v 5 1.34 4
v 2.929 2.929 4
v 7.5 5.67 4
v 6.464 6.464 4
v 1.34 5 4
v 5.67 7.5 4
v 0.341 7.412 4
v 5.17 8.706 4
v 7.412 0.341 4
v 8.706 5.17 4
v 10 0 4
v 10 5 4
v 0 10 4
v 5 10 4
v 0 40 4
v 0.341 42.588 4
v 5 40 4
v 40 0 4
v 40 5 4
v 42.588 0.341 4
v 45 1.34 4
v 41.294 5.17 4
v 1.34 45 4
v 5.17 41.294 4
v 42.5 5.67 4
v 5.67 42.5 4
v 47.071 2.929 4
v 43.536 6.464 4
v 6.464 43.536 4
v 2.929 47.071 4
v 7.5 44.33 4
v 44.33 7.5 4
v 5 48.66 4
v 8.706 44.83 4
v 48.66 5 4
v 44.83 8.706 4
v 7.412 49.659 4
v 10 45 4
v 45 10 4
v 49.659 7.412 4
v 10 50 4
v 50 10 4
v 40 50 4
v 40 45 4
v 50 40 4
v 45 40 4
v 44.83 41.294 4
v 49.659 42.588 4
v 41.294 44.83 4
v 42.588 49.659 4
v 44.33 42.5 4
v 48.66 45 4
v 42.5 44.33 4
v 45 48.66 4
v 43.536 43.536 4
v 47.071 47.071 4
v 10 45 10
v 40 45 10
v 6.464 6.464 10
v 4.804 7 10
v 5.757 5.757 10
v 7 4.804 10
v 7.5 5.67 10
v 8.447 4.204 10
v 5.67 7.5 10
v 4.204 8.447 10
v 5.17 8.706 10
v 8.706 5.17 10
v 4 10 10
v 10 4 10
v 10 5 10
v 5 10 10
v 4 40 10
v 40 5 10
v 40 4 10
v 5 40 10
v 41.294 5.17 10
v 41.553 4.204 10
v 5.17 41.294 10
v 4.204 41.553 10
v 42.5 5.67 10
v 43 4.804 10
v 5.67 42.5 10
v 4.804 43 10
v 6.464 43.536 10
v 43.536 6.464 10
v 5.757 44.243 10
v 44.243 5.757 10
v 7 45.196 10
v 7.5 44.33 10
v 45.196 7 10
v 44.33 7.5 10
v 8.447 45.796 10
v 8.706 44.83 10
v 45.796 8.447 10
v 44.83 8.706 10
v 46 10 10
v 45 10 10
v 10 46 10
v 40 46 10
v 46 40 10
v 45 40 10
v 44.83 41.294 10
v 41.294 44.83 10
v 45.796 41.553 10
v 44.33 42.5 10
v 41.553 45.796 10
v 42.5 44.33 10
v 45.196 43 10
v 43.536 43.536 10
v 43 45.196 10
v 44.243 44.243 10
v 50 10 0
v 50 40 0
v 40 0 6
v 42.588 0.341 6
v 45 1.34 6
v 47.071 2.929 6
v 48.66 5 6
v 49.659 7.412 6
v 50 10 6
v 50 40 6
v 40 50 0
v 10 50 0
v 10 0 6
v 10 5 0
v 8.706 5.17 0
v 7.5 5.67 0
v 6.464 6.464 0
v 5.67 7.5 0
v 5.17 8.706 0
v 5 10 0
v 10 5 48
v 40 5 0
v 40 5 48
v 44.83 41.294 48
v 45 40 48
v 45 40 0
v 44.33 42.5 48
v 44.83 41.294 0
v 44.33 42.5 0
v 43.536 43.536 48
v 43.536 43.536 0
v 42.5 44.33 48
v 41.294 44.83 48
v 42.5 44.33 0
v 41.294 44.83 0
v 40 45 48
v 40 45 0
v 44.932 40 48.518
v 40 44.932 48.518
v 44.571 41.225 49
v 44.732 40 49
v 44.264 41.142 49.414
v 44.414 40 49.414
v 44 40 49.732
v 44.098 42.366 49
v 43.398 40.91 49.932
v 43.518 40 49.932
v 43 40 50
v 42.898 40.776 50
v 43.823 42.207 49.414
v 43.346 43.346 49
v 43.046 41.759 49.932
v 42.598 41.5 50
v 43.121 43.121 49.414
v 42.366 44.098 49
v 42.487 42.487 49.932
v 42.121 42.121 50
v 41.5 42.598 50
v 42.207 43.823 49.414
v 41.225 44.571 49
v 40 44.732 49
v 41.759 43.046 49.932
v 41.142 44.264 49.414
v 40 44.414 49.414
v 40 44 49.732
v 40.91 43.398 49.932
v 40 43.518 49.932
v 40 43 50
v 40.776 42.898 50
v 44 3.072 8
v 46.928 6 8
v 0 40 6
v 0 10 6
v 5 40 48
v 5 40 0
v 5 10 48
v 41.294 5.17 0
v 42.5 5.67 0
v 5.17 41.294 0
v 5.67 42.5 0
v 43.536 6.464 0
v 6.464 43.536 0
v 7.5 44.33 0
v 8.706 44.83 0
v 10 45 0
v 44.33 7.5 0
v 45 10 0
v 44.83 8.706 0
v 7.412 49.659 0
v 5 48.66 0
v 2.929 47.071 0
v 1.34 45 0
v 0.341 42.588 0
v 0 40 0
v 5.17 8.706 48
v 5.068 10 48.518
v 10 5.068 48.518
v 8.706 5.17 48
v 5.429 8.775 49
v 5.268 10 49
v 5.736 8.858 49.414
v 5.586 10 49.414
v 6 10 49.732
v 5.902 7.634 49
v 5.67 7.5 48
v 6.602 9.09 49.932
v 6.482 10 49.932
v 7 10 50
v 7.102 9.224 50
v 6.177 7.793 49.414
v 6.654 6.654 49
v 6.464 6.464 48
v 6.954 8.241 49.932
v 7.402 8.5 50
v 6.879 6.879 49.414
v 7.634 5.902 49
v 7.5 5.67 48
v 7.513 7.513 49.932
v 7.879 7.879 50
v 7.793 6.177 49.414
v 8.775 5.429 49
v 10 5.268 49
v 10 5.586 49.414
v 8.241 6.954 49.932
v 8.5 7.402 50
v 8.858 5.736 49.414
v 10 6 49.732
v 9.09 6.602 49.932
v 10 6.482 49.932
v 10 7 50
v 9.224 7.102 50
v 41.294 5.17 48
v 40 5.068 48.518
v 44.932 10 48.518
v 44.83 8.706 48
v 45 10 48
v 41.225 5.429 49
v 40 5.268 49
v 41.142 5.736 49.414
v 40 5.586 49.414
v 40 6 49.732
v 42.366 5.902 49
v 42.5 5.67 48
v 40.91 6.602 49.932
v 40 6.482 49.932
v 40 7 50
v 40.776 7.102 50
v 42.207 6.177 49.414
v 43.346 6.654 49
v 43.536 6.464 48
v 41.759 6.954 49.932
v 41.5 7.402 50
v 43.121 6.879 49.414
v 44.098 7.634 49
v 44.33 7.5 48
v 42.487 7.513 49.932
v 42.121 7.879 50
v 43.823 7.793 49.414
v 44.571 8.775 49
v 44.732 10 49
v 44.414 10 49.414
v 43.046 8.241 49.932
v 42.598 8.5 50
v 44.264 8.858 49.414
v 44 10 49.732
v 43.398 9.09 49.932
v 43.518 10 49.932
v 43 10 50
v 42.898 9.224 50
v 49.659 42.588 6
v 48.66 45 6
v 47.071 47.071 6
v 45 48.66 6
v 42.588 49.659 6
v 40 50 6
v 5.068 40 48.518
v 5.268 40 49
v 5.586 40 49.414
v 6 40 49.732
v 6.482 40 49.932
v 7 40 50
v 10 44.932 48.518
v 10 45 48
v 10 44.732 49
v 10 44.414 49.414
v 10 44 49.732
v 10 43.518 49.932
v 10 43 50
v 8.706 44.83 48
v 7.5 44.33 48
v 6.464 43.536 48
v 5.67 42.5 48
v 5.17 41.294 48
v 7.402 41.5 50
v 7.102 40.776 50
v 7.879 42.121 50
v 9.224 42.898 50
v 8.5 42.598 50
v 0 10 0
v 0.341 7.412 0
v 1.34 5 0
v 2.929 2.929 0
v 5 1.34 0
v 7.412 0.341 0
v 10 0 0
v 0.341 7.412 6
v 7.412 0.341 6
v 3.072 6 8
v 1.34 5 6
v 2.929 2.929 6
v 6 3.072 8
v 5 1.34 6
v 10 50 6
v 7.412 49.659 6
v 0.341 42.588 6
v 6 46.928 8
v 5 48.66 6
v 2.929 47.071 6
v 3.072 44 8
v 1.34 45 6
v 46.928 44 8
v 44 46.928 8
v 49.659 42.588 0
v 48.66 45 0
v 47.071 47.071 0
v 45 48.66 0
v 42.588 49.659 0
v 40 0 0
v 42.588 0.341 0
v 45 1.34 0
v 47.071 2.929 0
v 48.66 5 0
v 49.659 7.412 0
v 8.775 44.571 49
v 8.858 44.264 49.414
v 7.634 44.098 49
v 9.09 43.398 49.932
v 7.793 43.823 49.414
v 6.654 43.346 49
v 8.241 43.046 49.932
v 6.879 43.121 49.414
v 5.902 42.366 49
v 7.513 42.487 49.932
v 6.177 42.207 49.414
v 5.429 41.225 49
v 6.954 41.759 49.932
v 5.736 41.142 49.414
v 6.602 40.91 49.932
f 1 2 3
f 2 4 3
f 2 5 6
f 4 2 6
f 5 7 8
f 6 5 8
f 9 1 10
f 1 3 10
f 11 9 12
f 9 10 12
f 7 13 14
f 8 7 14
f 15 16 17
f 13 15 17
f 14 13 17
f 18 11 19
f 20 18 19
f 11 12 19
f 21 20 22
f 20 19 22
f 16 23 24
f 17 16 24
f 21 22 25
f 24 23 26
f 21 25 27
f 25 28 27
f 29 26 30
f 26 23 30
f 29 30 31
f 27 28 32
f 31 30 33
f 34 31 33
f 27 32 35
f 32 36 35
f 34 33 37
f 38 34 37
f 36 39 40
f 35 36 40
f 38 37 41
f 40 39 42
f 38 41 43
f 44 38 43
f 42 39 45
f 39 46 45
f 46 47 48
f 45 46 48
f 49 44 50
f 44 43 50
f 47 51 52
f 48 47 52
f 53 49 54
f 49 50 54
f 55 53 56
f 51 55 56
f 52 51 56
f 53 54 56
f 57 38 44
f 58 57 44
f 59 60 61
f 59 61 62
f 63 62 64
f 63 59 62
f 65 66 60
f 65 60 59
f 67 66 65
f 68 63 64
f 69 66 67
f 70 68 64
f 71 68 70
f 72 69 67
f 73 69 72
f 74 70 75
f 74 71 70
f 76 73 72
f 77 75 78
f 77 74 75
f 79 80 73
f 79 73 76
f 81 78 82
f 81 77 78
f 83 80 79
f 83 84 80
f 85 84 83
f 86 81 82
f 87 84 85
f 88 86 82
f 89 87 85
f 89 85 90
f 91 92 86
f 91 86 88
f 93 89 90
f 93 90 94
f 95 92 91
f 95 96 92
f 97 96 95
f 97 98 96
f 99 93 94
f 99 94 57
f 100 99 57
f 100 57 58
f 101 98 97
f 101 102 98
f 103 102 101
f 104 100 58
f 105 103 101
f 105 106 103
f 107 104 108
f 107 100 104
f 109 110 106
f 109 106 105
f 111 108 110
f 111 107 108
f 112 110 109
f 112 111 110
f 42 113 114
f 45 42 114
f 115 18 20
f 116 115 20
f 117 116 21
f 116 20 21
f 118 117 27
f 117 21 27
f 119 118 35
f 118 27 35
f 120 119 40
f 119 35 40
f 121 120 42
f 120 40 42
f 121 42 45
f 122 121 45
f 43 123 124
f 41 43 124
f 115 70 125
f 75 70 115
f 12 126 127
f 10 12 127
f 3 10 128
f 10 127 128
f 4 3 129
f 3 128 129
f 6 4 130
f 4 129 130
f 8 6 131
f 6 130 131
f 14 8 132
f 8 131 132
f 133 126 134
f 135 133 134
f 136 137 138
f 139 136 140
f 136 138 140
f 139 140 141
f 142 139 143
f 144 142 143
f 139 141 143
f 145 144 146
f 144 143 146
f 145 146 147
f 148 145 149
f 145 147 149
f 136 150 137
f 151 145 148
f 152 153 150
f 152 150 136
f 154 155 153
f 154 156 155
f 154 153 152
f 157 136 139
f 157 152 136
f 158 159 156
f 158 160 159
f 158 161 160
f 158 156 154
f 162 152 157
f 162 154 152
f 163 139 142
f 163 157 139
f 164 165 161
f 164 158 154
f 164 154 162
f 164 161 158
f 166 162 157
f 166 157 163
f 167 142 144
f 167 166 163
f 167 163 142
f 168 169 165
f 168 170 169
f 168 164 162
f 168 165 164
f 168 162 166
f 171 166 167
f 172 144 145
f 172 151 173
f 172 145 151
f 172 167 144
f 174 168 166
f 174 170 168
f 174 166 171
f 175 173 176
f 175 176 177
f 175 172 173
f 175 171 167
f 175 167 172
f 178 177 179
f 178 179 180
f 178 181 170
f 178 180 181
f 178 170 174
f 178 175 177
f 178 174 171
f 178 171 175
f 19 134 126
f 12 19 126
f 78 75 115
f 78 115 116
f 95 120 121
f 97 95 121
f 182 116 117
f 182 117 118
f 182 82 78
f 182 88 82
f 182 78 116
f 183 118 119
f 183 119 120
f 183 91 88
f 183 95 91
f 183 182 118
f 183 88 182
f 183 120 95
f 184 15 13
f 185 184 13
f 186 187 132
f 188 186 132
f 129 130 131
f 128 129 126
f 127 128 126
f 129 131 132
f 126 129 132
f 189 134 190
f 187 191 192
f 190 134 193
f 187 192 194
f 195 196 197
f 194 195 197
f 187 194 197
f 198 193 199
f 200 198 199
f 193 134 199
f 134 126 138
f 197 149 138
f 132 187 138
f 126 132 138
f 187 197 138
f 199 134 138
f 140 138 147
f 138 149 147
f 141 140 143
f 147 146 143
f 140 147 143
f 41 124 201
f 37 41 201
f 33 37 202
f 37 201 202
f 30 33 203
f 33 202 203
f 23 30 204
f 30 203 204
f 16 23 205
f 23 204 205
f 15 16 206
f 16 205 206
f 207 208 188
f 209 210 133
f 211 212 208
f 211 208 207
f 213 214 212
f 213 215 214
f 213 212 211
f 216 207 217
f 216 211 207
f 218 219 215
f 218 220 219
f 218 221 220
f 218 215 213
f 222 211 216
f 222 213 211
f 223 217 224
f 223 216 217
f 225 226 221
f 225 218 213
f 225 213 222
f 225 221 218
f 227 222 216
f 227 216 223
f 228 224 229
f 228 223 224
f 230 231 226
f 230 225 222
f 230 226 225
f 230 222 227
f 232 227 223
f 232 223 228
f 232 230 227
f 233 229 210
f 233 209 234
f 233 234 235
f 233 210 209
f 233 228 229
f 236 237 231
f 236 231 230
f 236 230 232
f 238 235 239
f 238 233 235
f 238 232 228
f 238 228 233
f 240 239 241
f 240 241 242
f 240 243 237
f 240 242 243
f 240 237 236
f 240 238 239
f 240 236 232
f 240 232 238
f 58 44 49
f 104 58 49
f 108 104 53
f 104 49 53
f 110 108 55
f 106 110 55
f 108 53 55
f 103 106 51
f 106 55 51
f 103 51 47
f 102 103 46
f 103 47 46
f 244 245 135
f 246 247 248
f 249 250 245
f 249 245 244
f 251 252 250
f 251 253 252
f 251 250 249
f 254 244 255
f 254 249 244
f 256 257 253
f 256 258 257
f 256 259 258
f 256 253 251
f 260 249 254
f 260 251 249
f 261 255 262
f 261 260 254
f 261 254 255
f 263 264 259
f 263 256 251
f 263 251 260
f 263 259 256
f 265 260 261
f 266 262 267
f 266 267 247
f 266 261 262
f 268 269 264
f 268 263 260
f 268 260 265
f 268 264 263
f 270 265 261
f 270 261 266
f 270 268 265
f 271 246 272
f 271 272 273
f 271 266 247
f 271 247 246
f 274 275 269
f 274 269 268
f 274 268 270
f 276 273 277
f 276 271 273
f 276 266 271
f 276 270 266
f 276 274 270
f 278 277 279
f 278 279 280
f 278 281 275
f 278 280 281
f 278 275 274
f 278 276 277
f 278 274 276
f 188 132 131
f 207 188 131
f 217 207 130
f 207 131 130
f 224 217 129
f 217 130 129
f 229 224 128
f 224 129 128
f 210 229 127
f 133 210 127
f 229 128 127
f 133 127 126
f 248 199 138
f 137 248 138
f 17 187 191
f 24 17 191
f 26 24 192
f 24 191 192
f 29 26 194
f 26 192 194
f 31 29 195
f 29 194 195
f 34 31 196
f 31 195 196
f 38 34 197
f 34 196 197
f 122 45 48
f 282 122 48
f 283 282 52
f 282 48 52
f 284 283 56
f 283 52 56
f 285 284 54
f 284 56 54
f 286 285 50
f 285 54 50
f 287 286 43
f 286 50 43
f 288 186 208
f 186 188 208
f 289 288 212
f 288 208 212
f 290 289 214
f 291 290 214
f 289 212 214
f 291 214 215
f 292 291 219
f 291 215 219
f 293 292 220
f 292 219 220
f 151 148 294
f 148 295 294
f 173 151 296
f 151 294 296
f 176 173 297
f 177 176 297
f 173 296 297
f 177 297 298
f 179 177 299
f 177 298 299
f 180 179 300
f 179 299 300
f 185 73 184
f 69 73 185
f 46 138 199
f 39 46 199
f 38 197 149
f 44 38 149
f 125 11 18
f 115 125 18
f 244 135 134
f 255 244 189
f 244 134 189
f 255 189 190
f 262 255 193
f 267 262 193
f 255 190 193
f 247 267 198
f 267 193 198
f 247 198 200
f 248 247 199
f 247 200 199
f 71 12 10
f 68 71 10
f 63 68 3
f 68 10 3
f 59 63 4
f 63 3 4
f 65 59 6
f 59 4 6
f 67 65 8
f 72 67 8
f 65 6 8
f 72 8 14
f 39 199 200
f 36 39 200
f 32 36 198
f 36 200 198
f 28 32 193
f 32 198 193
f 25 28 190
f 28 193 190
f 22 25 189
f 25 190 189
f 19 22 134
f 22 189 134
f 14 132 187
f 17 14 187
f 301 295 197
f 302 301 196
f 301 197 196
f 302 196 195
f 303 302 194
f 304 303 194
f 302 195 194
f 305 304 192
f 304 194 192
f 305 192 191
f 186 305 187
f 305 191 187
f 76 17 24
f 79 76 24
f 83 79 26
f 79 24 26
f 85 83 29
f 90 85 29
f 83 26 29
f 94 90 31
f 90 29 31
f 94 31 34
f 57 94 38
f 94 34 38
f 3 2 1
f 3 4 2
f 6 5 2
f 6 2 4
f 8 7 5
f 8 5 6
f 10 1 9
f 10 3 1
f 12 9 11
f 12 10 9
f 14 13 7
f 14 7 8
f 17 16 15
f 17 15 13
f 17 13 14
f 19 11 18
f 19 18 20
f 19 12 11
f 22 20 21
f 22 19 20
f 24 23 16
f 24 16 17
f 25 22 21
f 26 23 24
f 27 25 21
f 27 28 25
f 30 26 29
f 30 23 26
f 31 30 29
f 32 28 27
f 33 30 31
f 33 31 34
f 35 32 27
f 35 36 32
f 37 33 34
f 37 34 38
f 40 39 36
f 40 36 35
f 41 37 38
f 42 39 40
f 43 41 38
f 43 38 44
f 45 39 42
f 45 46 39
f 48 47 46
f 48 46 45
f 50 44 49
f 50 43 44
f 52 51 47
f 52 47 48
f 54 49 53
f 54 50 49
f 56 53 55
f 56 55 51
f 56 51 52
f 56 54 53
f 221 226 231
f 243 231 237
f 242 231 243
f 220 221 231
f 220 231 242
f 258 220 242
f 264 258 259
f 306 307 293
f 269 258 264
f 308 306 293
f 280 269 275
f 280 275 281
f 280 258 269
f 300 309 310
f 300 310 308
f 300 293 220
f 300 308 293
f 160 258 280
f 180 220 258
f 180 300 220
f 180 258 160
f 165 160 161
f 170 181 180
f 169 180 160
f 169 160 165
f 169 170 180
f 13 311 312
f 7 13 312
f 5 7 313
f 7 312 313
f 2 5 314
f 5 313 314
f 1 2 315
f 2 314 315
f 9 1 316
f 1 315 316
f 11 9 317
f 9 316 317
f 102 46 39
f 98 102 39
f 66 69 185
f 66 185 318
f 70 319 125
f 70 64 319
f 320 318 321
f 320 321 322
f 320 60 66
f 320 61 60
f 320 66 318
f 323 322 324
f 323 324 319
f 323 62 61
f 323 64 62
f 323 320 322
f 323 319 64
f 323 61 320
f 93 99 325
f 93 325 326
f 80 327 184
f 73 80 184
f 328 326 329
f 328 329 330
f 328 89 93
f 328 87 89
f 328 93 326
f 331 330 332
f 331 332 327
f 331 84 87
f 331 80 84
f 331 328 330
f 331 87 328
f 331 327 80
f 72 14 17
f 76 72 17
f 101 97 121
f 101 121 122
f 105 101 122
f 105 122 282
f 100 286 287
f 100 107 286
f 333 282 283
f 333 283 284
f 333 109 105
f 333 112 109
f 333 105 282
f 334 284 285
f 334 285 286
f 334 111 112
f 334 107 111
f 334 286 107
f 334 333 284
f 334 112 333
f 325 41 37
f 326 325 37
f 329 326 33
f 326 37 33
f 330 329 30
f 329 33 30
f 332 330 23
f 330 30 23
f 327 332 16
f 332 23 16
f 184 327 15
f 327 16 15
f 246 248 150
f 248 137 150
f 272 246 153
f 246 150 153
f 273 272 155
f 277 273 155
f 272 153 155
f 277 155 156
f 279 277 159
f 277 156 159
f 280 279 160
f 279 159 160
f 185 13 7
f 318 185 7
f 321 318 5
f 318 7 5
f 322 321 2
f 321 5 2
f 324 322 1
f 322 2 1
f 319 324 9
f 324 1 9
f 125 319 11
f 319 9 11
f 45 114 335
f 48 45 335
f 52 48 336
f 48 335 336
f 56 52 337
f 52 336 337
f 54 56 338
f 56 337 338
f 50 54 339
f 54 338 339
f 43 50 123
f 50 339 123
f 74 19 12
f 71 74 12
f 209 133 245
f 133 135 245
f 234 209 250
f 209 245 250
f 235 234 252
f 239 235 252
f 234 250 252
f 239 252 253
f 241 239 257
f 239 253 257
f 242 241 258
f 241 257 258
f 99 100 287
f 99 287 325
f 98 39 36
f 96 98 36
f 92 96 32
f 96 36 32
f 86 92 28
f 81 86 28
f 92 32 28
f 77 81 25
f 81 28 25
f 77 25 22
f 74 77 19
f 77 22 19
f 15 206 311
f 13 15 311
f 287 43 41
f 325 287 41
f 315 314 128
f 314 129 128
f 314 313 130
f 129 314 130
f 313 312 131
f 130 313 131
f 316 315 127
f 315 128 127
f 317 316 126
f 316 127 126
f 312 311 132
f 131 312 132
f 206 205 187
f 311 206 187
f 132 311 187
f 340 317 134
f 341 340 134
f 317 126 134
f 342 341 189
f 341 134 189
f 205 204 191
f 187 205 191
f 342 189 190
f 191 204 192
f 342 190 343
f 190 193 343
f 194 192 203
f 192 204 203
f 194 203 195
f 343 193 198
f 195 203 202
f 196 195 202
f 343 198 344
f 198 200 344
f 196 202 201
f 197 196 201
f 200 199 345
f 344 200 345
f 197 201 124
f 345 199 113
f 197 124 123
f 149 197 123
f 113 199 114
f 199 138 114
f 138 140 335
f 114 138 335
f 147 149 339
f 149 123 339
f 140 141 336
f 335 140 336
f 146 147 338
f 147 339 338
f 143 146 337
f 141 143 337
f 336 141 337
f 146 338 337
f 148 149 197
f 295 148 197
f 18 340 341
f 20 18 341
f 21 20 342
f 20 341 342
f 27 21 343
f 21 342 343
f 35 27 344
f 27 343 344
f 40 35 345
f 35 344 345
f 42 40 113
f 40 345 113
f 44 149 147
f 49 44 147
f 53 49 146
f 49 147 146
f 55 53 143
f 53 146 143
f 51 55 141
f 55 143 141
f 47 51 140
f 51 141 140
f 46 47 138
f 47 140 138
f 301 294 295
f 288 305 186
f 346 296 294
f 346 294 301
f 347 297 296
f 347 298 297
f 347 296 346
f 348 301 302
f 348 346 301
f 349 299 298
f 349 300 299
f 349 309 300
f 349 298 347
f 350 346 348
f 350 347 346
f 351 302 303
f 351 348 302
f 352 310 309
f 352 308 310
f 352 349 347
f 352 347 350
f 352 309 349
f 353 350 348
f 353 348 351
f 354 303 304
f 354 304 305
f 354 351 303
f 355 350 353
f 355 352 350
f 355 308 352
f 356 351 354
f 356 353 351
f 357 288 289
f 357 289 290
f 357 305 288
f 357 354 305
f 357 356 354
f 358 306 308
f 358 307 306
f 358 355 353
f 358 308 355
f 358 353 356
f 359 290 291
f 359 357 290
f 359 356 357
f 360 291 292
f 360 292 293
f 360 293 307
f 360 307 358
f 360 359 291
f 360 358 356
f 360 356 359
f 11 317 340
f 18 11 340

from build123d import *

# Parameters (mm, degrees)
F1_DEPTH = 4
F2_START = 4
F2_DEPTH = 6
F3_SIZE  = 4
F4_DEPTH = 50
F5_R     = 2


with BuildPart() as f1:
    # F0 (on Top) → F1 (new body)
    with BuildSketch(Plane.XY):
        with BuildLine():
            ThreePointArc((0, 10), (2.9289321881, 2.9289321881), (10, 0))
            Line((10, 0), (40, 0))
            ThreePointArc((40, 0), (47.0710678119, 2.9289321881), (50, 10))
            Line((50, 10), (50, 40))
            ThreePointArc((50, 40), (47.0710678119, 47.0710678119), (40, 50))
            Line((40, 50), (10, 50))
            ThreePointArc((10, 50), (2.9289321881, 47.0710678119), (0, 40))
            Line((0, 40), (0, 10))
        make_face()
        with BuildLine():
            Line((40, 5), (10, 5))
            ThreePointArc((10, 5), (6.4644660941, 6.4644660941), (5, 10))
            Line((5, 10), (5, 40))
            ThreePointArc((5, 40), (6.4644660941, 43.5355339059), (10, 45))
            Line((10, 45), (40, 45))
            ThreePointArc((40, 45), (43.5355339059, 43.5355339059), (45, 40))
            Line((45, 40), (45, 10))
            ThreePointArc((45, 10), (43.5355339059, 6.4644660941), (40, 5))
        make_face(mode=Mode.SUBTRACT)
    extrude(amount=F1_DEPTH)


with BuildPart() as f2:
    # F0 (on Top) → F2 (new body)
    with BuildSketch(Plane.XY.offset(F2_START)):
        with BuildLine():
            ThreePointArc((0, 10), (2.9289321881, 2.9289321881), (10, 0))
            Line((10, 0), (40, 0))
            ThreePointArc((40, 0), (47.0710678119, 2.9289321881), (50, 10))
            Line((50, 10), (50, 40))
            ThreePointArc((50, 40), (47.0710678119, 47.0710678119), (40, 50))
            Line((40, 50), (10, 50))
            ThreePointArc((10, 50), (2.9289321881, 47.0710678119), (0, 40))
            Line((0, 40), (0, 10))
        make_face()
        with BuildLine():
            Line((40, 5), (10, 5))
            ThreePointArc((10, 5), (6.4644660941, 6.4644660941), (5, 10))
            Line((5, 10), (5, 40))
            ThreePointArc((5, 40), (6.4644660941, 43.5355339059), (10, 45))
            Line((10, 45), (40, 45))
            ThreePointArc((40, 45), (43.5355339059, 43.5355339059), (45, 40))
            Line((45, 40), (45, 10))
            ThreePointArc((45, 10), (43.5355339059, 6.4644660941), (40, 5))
        make_face(mode=Mode.SUBTRACT)
    extrude(amount=F2_DEPTH)

    # F3
    f3_edges = [f2.edges().sort_by_distance(p)[0] for p in [
        (50, 25, 10),
    ]]
    chamfer(f3_edges, length=F3_SIZE)


with BuildPart() as f4:
    # F0 (on Top) → F4 (new body)
    with BuildSketch(Plane.XY):
        with BuildLine():
            ThreePointArc((5, 10), (6.4644660941, 6.4644660941), (10, 5))
            Line((10, 5), (40, 5))
            ThreePointArc((40, 5), (43.5355339059, 6.4644660941), (45, 10))
            Line((45, 10), (45, 40))
            ThreePointArc((45, 40), (43.5355339059, 43.5355339059), (40, 45))
            Line((40, 45), (10, 45))
            ThreePointArc((10, 45), (6.4644660941, 43.5355339059), (5, 40))
            Line((5, 40), (5, 10))
        make_face()
    extrude(amount=F4_DEPTH)

    # F5
    f5_edges = [f4.edges().sort_by_distance(p)[0] for p in [
        (25, 45, 50),
    ]]
    fillet(f5_edges, radius=F5_R)


solid = Compound([f1.part, f2.part, f4.part])
